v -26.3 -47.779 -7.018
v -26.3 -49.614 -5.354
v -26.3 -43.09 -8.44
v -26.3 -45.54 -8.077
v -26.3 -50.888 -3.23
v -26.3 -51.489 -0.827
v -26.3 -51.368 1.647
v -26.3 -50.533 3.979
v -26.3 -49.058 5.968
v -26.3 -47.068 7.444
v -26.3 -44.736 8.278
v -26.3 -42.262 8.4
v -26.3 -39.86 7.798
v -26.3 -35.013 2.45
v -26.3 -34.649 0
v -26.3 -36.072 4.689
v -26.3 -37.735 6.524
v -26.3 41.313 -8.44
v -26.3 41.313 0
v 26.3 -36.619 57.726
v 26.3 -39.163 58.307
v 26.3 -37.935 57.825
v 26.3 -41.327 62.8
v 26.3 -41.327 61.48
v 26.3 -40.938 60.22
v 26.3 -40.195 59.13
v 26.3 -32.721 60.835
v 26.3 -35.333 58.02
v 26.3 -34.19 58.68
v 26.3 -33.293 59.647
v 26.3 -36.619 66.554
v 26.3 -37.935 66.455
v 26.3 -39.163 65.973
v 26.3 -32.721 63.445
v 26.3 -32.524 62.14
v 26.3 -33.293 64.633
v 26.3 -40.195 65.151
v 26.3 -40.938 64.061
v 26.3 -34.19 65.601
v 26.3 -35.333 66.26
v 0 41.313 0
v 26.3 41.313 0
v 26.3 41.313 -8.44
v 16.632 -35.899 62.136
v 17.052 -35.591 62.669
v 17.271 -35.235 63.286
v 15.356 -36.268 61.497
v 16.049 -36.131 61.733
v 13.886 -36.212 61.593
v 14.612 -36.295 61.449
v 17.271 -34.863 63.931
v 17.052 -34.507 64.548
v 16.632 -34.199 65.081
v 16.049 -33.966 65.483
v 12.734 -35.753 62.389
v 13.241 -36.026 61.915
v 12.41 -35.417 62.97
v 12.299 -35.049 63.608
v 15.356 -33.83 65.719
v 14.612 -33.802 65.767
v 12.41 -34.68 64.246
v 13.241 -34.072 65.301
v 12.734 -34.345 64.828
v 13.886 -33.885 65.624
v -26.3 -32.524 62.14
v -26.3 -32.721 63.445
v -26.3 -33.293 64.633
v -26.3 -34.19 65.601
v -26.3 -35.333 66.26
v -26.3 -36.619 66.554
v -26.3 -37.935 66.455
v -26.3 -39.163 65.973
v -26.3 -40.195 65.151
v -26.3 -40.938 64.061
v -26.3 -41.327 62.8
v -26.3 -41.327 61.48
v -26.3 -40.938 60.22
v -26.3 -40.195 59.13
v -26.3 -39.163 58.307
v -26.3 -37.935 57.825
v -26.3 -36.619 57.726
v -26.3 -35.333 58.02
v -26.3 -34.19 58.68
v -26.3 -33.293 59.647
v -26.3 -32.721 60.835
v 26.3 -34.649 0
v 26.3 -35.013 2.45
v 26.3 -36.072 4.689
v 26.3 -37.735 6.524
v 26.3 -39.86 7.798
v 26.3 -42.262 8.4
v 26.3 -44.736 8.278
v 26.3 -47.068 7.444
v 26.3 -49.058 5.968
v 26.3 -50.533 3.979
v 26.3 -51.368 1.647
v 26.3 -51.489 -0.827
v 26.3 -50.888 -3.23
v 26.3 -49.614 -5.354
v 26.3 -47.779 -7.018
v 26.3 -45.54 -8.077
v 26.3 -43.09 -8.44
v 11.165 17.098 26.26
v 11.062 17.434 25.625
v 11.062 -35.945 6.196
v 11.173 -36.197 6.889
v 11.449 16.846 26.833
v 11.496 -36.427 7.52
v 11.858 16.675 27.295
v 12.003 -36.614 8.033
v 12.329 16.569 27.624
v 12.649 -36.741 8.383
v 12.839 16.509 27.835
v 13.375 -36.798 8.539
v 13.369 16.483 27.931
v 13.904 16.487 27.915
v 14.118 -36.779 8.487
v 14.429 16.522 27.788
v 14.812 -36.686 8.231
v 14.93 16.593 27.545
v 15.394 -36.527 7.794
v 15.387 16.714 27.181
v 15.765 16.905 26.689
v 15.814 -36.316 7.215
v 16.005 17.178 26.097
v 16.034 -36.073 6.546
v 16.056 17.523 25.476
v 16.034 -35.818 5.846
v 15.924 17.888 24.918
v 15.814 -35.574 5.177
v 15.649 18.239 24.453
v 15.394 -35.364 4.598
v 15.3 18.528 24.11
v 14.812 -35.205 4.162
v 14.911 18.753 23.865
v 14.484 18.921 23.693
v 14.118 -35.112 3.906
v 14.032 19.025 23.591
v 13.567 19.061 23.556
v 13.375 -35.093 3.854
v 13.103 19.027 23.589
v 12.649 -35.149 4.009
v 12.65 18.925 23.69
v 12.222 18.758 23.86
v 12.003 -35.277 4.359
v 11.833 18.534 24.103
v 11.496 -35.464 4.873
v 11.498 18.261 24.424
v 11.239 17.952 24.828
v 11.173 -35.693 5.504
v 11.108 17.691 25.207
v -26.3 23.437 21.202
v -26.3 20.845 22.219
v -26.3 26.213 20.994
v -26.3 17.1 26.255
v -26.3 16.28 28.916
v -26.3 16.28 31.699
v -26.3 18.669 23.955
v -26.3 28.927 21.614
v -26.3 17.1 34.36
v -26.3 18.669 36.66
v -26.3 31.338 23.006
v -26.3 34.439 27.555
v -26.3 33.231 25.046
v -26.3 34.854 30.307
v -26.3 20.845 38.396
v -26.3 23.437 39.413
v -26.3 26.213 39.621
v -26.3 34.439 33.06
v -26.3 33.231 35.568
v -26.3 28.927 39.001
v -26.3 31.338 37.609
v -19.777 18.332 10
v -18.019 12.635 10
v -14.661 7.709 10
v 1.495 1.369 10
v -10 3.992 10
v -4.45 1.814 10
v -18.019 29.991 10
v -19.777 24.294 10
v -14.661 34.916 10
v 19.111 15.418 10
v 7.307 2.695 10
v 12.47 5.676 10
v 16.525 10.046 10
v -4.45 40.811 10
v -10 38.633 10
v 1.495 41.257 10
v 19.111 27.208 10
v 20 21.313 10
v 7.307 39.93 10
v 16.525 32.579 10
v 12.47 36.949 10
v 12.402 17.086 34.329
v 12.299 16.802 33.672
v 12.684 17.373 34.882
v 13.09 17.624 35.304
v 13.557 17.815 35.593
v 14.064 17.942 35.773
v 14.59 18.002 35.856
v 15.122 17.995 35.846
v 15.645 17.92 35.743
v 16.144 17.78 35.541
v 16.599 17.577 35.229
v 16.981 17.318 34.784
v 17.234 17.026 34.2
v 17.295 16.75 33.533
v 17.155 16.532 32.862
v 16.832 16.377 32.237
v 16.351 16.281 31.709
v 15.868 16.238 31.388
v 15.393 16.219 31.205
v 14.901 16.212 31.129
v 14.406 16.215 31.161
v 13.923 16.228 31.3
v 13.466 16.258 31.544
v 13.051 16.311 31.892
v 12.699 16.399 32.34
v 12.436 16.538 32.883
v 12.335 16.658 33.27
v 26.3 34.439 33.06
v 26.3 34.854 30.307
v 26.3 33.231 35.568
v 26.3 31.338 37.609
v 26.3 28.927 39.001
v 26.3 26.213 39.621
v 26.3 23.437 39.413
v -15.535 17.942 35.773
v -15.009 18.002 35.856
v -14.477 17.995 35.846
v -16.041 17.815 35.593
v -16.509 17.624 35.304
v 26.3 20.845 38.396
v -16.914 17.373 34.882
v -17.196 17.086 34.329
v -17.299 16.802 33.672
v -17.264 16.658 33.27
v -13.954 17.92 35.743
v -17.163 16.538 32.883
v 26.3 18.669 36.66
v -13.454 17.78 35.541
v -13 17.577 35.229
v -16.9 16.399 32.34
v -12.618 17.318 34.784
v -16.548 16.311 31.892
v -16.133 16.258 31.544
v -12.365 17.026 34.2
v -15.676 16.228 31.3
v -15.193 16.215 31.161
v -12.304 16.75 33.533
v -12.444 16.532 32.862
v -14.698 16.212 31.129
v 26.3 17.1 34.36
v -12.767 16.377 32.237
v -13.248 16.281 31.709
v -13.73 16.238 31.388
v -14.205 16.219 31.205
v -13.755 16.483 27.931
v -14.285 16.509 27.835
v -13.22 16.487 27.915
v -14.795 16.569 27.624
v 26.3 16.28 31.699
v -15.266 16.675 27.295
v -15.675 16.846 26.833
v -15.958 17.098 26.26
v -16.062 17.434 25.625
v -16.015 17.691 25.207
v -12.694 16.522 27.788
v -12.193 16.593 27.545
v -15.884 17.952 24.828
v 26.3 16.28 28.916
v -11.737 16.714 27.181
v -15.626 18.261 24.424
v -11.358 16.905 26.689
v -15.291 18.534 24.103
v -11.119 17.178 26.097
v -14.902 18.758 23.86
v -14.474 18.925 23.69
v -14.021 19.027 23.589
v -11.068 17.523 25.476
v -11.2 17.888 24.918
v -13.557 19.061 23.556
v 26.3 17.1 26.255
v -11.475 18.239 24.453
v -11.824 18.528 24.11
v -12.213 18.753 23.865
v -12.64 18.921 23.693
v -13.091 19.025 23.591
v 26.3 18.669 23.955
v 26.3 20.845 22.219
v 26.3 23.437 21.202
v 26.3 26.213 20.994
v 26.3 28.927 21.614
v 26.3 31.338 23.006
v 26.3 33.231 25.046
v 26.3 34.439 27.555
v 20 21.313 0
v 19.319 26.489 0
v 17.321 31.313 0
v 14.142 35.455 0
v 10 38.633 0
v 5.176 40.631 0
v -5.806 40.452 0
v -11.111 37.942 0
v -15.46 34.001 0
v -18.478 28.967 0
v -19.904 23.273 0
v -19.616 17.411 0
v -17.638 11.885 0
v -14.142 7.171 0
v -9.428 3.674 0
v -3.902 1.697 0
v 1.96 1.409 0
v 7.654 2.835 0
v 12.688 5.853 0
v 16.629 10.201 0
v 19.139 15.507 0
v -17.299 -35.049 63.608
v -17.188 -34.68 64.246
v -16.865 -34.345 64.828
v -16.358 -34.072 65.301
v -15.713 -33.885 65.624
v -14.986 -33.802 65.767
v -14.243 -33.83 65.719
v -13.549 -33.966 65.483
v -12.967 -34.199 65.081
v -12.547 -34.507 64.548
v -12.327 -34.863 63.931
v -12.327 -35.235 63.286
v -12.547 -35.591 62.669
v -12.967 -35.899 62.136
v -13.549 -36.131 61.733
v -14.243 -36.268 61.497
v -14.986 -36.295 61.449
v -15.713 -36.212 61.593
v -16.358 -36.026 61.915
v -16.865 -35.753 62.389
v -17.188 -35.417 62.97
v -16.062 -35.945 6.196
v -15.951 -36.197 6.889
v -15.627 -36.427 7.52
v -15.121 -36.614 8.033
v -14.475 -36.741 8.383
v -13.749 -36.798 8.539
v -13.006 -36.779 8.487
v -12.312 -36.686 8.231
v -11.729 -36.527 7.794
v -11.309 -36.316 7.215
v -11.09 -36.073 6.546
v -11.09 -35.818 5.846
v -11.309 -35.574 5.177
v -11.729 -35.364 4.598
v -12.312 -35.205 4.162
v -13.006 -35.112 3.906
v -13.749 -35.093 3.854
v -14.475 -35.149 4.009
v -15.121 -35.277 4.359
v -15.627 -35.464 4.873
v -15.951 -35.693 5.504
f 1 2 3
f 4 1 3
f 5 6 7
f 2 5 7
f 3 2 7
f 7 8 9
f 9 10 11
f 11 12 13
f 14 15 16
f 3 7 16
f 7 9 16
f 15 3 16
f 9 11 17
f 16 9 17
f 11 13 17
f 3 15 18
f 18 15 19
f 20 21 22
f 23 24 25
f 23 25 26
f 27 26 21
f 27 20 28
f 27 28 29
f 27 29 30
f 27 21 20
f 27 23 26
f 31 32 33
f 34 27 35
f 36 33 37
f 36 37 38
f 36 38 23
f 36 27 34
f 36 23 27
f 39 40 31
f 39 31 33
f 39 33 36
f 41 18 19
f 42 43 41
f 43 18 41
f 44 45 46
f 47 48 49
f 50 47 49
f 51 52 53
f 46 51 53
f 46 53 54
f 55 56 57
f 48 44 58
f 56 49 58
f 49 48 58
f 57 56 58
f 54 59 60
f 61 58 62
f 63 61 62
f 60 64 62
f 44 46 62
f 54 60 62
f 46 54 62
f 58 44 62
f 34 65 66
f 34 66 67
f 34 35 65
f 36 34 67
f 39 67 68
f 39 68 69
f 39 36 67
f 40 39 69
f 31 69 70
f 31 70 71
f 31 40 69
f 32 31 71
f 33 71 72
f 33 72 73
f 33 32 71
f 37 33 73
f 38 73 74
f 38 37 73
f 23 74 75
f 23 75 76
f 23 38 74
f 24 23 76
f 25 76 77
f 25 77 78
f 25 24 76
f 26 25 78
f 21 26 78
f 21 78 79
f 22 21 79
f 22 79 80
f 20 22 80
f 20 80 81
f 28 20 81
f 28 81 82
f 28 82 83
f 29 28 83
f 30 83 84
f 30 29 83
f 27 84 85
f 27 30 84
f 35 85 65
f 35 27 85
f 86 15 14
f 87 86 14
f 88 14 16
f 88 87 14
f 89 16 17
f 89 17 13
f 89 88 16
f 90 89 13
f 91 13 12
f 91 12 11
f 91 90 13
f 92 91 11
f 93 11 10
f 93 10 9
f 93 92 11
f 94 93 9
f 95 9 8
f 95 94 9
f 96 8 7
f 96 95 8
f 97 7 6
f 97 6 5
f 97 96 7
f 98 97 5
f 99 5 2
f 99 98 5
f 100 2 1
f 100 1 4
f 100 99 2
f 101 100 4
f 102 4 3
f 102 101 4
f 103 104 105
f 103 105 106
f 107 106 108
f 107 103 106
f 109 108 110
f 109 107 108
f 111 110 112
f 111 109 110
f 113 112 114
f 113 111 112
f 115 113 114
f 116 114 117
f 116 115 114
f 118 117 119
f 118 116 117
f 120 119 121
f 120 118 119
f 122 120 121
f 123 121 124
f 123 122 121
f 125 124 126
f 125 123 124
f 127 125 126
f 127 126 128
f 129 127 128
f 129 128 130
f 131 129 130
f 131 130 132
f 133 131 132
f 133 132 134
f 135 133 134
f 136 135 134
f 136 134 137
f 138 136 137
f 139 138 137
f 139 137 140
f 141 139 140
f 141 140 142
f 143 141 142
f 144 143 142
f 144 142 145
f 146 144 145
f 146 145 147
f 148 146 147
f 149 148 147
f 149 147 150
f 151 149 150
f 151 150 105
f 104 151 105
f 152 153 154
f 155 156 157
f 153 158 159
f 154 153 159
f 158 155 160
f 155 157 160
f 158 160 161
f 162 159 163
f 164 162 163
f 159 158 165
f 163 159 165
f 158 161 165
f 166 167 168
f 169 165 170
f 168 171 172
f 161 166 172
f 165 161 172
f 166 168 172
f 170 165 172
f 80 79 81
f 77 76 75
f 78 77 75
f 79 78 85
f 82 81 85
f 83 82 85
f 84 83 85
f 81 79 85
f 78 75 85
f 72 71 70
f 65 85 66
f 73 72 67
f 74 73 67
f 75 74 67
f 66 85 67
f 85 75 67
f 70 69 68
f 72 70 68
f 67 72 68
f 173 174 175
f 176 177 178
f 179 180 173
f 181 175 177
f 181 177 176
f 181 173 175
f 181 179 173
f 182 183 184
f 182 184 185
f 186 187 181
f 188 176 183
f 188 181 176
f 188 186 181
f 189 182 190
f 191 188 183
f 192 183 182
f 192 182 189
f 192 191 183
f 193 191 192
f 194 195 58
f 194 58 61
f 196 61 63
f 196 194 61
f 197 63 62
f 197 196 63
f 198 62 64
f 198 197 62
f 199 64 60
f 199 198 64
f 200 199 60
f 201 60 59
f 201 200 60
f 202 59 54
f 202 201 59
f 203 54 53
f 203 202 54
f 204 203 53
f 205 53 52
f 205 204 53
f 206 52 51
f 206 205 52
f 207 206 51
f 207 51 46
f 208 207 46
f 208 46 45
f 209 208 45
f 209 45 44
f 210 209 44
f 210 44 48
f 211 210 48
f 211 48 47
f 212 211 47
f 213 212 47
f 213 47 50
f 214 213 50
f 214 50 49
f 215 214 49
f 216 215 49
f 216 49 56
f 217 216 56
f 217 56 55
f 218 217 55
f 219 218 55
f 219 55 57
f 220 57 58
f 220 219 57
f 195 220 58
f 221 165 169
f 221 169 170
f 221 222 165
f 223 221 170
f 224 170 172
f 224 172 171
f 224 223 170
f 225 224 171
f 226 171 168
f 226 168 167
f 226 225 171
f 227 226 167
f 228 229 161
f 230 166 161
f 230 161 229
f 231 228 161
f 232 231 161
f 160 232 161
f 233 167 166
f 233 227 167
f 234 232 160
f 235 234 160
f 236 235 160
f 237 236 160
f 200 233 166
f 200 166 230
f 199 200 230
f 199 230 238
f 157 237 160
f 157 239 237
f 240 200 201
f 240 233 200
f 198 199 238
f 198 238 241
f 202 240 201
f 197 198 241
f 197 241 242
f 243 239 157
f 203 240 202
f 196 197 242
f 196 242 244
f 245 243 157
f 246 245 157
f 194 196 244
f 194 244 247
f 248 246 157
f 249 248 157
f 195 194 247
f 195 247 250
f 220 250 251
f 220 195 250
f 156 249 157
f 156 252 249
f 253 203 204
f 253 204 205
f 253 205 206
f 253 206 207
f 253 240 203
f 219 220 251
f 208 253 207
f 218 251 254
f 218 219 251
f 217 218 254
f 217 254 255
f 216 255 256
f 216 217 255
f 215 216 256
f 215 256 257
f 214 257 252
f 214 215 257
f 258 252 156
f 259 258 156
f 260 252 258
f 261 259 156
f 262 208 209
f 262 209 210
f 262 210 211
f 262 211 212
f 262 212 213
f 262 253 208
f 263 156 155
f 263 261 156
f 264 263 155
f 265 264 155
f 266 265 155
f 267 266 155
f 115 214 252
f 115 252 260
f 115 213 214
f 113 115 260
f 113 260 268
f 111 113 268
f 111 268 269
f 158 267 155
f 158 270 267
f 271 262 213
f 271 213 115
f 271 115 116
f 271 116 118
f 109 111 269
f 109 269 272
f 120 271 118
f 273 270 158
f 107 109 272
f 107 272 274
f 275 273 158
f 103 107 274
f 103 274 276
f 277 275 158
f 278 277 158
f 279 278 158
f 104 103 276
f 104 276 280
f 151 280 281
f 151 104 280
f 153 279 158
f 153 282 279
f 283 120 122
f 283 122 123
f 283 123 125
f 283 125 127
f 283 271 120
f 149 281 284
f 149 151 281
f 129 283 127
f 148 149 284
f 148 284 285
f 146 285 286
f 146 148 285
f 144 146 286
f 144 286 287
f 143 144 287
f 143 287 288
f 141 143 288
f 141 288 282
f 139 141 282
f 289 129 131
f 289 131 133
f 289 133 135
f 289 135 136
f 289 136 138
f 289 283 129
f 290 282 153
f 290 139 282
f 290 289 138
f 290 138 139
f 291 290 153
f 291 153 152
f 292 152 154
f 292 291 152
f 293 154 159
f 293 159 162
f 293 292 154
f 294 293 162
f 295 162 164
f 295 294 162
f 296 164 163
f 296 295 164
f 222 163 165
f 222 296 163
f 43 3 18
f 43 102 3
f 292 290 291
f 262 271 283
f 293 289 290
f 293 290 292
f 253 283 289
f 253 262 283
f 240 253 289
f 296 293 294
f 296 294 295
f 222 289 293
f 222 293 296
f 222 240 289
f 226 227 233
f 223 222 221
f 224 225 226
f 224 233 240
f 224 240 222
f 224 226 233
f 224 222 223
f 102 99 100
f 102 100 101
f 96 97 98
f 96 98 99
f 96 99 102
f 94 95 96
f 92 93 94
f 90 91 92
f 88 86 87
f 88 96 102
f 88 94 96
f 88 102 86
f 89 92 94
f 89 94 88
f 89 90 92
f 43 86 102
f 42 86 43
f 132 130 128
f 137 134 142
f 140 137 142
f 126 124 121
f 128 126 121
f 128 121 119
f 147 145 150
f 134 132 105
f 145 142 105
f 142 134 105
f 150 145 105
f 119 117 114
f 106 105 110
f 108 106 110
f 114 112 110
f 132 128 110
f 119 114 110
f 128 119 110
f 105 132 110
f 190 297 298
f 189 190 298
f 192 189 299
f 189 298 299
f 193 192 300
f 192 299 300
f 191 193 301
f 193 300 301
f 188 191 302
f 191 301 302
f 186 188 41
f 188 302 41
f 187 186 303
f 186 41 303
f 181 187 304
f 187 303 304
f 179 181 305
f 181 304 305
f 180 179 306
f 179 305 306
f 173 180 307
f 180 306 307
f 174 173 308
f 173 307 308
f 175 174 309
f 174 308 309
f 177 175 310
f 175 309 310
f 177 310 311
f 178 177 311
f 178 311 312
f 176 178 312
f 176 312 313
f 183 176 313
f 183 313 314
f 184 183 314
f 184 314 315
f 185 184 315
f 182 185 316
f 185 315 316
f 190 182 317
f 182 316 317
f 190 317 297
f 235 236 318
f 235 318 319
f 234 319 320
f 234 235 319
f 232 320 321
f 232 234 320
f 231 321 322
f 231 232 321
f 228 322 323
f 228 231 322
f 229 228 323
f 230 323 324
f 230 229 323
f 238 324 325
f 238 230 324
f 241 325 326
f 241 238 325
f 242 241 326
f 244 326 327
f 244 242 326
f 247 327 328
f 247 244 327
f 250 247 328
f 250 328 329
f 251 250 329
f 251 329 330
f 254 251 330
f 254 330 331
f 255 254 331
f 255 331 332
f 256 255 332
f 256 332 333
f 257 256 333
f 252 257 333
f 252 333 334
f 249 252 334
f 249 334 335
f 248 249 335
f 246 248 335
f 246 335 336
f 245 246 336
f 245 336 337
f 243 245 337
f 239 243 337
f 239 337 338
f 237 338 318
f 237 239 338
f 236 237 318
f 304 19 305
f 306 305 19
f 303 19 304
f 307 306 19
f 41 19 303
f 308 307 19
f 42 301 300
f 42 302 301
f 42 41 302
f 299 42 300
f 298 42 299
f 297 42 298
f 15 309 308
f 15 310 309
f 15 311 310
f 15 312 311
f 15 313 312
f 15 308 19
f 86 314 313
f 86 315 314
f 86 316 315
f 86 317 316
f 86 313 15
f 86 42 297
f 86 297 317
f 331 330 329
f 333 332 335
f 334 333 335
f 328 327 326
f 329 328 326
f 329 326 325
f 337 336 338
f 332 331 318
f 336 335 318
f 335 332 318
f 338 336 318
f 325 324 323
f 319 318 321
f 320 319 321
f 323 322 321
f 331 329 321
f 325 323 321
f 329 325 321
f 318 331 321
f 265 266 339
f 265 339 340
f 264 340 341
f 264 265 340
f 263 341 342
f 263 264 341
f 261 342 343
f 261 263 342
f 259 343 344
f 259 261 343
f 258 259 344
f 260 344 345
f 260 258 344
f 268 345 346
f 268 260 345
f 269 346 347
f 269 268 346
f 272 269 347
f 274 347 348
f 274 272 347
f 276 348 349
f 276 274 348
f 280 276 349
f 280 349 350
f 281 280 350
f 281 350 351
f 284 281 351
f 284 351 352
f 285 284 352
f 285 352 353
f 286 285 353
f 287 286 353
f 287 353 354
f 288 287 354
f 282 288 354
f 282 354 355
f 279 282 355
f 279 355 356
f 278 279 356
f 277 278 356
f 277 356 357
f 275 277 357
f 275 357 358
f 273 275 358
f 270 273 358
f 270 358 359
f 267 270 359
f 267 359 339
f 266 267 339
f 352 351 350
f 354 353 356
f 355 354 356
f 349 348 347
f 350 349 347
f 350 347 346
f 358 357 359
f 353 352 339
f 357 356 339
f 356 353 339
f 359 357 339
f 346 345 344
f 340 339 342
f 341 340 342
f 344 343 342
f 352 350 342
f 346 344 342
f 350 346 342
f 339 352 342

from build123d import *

# Parameters (mm, degrees)
F1_DEPTH = 26.3
F0_R     = 9.3392786486
F0_R_2   = 4.4261331471
F3_R     = 2.5
F4_DEPTH = 69.1
F5_R     = 20
F6_DEPTH = 10
F8_R     = 2.5
F9_DEPTH = 66


with BuildPart() as f1:
    # F0 (on Right) → F1 (new body, symmetric)
    with BuildSketch(Plane.YZ):
        with BuildLine():
            Line((41.3128472865, -8.4402561188), (41.3128472865, 0))
            Line((41.3128472865, 0), (-34.6494913101, 0))
            ThreePointArc((-34.6494913101, 0), (-49.0579097654, 5.9681623365), (-43.0897474289, -8.4402561188))
            Line((-43.0897474289, -8.4402561188), (41.3128472865, -8.4402561188))
        make_face()
    extrude(amount=F1_DEPTH, both=True)

    # F5 (on face) → F6 (join)
    with BuildSketch(Plane.XY):
        with Locations((0, 21.3128472865)):
            Circle(F5_R)
    extrude(amount=F6_DEPTH)


with BuildPart() as f1b:
    # F0 (on Right) → F1, piece 2 (new body, symmetric)
    with BuildSketch(Plane.YZ):
        with Locations((25.5147498101, 30.307456851)):
            Circle(F0_R)
    extrude(amount=F1_DEPTH, both=True)



with BuildPart() as f1c:
    # F0 (on Right) → F1, piece 3 (new body, symmetric)
    with BuildSketch(Plane.YZ):
        with Locations((-36.9500517845, 62.1401146054)):
            Circle(F0_R_2)
    extrude(amount=F1_DEPTH, both=True)


with BuildPart() as f4:
    # F3 (on face) → F4 (new body)
    with BuildSketch(Plane(origin=(0, 6.012548579, -3.4713465406), x_dir=(-1, 0, 0), z_dir=(0, 0.8660254038, -0.5))):
        with Locations((-14.7993247956, 37.5618748367)):
            Circle(F3_R)
        with Locations((14.7993247956, 37.5618748367)):
            Circle(F3_R)
    extrude(amount=-F4_DEPTH)


with BuildPart() as f1b_1:
    add(f1b.part)

    add(f4.part)  # F9 merges F4
    # F8 (on face) → F9 (join)
    with BuildSketch(Plane(origin=(0, 32.2707199323, 11.7455814937), x_dir=(-1, 0, 0), z_dir=(0, 0.9396926208, 0.3420201433))):
        with Locations((13.5618625209, 18.1164778769)):
            Circle(F8_R)
        with Locations((-13.5618625209, 18.1164778769)):
            Circle(F8_R)
    extrude(amount=-F9_DEPTH)


solid = Compound([f1.part, f1c.part, f1b_1.part])
